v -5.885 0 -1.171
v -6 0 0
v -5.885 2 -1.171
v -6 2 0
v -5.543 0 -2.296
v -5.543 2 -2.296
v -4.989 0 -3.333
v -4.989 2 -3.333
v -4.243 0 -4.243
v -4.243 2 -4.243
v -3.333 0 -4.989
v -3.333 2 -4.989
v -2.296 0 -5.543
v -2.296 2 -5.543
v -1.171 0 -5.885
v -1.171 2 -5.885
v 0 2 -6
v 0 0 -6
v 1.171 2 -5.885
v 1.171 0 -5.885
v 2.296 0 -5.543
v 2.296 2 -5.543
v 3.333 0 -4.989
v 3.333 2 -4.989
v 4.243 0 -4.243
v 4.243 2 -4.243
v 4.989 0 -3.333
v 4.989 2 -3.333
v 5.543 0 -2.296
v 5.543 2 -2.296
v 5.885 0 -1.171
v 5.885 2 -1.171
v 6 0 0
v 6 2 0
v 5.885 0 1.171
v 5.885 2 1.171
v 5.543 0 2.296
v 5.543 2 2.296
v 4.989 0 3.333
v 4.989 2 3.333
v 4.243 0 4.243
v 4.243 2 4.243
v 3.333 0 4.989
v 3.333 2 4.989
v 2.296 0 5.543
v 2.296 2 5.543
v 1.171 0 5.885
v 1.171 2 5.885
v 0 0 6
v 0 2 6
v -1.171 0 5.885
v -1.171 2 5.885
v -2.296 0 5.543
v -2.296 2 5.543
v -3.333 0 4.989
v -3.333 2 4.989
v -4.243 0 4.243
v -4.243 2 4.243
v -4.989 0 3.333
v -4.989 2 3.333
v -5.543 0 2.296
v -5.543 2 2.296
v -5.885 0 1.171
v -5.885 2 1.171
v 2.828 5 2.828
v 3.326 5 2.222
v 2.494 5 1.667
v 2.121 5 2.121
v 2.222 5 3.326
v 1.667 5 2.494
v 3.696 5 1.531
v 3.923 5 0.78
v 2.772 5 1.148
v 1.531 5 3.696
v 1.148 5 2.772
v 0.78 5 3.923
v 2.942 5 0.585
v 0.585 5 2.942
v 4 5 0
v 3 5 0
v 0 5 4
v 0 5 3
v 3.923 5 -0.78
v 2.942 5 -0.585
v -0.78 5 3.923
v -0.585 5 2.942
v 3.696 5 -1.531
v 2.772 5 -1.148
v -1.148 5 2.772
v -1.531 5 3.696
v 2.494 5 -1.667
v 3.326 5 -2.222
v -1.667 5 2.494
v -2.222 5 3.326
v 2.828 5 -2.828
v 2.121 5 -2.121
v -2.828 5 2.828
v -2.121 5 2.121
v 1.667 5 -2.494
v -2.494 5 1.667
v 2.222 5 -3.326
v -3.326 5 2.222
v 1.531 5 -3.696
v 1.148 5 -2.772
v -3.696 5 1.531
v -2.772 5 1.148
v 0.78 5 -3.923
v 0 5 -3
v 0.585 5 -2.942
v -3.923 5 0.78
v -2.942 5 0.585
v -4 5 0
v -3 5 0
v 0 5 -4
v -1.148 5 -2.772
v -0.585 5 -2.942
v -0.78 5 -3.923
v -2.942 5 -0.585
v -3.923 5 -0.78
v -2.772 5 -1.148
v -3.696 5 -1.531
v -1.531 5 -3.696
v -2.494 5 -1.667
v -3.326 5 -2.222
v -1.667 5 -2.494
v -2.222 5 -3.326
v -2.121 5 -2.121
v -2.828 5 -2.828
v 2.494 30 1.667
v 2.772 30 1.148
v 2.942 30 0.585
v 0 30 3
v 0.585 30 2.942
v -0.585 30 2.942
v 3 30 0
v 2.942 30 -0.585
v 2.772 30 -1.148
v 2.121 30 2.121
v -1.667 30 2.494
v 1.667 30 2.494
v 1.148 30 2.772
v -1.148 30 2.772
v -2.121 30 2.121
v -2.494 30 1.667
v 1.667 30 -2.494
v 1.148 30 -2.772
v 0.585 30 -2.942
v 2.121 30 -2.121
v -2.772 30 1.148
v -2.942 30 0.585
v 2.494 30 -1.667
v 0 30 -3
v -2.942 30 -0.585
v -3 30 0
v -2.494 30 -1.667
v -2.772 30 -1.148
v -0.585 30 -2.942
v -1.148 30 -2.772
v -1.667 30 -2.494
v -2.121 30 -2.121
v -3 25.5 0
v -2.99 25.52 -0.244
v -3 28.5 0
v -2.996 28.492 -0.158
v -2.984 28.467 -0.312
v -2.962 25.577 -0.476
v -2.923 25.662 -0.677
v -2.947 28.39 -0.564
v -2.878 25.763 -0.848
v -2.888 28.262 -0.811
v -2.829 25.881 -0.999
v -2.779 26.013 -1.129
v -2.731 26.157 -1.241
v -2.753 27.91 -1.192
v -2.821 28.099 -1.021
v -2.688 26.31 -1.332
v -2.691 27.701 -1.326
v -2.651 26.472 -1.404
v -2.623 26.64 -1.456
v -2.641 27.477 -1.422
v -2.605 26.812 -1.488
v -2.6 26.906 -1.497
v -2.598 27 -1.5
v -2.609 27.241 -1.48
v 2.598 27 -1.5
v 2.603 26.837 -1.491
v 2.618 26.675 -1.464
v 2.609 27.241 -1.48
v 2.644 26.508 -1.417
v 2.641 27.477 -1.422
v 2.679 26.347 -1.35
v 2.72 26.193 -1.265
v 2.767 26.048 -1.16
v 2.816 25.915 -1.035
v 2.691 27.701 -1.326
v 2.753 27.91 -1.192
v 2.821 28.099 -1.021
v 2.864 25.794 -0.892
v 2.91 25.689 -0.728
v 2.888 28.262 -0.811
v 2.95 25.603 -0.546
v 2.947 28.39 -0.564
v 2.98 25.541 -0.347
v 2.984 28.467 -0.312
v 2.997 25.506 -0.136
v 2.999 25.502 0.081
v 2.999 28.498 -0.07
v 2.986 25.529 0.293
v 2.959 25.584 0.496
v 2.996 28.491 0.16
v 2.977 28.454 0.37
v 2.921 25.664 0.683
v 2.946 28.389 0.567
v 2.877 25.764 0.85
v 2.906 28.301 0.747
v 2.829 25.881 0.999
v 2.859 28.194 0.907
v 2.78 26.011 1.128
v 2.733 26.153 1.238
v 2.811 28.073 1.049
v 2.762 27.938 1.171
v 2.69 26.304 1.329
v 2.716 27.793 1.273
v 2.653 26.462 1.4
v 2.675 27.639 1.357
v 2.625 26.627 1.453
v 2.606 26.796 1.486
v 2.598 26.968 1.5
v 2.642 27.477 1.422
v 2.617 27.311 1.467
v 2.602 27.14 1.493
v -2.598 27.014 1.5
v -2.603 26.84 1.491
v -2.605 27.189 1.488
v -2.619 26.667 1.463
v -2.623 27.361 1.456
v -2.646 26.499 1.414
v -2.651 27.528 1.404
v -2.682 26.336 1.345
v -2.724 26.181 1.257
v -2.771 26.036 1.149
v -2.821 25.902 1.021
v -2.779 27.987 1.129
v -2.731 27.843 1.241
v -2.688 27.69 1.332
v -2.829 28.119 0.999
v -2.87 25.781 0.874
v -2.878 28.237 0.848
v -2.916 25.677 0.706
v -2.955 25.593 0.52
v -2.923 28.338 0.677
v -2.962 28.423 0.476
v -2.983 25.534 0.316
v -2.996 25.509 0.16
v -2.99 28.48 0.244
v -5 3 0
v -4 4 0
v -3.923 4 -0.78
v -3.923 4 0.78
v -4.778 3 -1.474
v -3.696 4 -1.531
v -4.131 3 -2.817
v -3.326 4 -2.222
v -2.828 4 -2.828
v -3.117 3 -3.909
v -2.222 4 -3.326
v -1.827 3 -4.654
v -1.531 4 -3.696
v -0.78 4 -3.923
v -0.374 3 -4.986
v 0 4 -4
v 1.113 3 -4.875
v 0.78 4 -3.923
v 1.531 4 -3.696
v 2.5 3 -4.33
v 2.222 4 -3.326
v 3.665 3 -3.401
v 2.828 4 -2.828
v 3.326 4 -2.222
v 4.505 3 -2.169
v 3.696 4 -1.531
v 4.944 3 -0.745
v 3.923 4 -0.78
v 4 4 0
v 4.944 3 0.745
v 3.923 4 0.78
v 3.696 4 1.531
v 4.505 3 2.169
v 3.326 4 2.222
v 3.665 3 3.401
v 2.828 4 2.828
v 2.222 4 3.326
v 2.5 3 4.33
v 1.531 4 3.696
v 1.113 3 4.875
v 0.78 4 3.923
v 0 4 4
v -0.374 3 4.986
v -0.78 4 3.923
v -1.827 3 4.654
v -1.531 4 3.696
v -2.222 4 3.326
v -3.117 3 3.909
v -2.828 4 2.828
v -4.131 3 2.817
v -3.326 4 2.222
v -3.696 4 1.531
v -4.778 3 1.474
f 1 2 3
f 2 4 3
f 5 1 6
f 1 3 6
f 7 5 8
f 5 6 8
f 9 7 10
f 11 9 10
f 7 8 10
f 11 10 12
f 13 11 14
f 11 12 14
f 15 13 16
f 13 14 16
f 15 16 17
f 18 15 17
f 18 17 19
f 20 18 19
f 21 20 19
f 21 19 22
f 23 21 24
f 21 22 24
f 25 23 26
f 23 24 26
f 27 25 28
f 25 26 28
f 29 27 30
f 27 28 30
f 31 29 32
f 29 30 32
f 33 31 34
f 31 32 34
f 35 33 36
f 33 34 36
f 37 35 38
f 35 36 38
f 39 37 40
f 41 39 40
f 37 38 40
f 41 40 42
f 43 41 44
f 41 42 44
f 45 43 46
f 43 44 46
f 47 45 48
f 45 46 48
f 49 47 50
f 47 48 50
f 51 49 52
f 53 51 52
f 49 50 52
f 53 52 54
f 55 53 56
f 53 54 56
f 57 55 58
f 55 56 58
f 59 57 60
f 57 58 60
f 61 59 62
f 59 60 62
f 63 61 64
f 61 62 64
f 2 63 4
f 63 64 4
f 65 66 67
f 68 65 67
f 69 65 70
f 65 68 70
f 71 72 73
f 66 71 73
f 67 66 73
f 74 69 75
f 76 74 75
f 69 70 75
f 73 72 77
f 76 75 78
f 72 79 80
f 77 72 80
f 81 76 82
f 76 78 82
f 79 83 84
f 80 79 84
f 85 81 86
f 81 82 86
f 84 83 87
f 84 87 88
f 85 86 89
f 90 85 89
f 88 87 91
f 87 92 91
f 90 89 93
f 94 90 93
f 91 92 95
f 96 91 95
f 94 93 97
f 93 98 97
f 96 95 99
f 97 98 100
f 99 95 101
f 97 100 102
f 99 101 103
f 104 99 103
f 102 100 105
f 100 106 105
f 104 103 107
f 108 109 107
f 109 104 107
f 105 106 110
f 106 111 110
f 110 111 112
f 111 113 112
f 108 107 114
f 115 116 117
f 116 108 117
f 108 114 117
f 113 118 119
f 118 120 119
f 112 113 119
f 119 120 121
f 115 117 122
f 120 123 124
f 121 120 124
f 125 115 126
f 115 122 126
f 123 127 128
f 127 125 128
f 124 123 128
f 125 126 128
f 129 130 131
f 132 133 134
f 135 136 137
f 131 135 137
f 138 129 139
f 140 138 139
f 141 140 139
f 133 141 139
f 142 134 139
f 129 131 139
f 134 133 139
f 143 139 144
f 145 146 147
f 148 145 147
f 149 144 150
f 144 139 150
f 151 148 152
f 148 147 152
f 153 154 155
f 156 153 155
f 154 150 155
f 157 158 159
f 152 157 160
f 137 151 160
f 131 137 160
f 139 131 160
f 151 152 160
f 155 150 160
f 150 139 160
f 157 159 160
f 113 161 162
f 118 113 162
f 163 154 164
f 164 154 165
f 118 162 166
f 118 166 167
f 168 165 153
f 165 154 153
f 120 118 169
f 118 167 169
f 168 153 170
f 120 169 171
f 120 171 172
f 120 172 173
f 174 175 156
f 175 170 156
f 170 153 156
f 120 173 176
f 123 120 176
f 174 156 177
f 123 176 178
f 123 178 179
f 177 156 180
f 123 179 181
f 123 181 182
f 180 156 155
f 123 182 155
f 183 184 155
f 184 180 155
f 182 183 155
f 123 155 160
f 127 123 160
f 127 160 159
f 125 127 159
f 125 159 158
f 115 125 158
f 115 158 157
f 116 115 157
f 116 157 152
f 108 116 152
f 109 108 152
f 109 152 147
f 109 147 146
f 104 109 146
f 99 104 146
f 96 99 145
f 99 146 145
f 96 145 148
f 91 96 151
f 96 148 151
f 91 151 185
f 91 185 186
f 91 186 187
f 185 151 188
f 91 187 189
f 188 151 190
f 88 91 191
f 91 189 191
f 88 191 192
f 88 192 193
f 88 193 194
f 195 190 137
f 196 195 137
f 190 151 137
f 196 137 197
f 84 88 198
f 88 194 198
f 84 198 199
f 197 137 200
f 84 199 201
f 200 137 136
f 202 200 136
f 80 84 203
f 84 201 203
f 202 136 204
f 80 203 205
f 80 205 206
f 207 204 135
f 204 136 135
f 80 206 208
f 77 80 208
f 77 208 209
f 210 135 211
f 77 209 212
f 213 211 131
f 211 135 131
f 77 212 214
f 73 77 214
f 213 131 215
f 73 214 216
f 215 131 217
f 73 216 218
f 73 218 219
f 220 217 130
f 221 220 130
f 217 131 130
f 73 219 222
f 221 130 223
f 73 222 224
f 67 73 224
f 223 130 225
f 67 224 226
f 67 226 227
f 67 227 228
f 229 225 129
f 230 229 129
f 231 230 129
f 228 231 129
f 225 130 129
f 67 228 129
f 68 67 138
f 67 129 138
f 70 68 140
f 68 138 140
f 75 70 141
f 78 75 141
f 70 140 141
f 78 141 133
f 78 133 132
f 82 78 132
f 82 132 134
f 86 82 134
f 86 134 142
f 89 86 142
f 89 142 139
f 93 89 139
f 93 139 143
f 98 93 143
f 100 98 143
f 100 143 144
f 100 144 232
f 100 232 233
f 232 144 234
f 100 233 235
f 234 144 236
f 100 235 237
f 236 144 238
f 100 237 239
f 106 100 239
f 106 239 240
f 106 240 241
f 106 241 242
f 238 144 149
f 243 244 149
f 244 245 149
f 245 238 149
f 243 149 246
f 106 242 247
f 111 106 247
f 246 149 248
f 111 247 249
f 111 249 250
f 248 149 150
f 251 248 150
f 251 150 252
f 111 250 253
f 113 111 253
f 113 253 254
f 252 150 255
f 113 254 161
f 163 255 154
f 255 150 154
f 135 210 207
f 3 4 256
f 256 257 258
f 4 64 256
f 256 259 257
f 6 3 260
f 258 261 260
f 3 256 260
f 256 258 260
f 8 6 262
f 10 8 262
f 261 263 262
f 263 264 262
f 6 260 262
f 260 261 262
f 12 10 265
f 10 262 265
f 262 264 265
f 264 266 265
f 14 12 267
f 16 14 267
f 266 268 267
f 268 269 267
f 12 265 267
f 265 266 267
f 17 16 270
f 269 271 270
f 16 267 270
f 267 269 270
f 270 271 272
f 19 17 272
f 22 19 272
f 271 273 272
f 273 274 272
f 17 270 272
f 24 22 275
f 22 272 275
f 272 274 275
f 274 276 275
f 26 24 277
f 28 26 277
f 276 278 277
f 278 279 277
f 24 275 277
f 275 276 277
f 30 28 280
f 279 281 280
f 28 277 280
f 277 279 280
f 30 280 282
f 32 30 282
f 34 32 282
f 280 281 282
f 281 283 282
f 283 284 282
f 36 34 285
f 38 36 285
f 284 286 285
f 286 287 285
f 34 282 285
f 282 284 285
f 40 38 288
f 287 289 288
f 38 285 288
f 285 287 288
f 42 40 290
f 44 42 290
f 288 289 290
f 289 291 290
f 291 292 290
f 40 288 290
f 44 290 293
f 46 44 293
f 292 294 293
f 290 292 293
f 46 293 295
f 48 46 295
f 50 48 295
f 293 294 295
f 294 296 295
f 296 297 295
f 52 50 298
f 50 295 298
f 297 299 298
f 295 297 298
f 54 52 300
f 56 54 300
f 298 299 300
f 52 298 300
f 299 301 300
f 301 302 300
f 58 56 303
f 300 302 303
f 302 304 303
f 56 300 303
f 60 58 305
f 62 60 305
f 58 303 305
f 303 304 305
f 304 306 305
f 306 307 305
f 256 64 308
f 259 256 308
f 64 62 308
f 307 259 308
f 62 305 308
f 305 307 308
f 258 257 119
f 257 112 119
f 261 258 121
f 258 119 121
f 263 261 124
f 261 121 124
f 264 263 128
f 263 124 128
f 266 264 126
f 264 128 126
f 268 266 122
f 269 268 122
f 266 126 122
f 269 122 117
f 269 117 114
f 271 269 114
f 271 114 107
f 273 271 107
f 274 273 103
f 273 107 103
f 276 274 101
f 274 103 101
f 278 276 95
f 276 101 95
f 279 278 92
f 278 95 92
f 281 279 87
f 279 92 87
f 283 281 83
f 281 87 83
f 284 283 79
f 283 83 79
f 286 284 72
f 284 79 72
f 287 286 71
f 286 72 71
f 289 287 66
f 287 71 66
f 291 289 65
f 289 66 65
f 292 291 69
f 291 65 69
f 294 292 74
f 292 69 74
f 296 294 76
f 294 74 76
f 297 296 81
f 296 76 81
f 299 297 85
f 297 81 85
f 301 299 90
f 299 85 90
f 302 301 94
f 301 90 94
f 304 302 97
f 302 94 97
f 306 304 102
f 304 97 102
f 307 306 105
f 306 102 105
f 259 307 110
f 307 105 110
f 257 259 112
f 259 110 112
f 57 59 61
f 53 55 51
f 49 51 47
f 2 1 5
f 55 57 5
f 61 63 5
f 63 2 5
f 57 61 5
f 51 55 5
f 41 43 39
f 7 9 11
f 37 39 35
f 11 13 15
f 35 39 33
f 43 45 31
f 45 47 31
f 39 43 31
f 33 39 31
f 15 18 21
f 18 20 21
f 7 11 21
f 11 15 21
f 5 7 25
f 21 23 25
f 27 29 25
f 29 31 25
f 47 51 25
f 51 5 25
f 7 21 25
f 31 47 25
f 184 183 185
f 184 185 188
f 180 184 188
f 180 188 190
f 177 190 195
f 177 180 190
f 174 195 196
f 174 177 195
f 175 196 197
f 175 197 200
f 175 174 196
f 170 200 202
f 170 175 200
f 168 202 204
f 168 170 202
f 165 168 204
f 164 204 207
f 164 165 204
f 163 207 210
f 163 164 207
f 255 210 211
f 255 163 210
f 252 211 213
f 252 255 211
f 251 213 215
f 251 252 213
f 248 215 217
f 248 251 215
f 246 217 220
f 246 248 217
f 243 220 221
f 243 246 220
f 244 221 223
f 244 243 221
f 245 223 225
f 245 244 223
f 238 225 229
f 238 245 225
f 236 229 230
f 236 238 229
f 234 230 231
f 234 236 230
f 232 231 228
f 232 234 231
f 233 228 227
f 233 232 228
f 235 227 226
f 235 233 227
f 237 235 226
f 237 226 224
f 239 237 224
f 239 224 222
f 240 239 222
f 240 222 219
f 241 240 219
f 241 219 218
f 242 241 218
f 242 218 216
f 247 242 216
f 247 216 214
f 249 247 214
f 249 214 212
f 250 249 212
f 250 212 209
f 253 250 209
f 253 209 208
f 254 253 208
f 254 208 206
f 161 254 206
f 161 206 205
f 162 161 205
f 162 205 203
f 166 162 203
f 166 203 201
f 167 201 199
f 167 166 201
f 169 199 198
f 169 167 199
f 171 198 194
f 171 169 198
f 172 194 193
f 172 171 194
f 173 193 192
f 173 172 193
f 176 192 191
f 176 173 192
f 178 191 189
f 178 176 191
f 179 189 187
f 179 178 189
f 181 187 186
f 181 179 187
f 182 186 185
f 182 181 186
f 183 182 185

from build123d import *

# Parameters (mm, degrees)
CUT_EXTRUDE1_DEPTH      = 32.176914536
CUT_EXTRUDE1_DEPTH_BACK = 32.176914536
SKETCH3_R               = 1.5


with BuildPart() as part:
    # Sketch2 → Revolve2 (revolve)
    with BuildSketch(Plane.XY):
        Polygon((0, 0), (-6, 0), (-6, 2), (-4, 4), (-4, 5), (-3, 5), (-3, 30), (0, 30), align=None)
    revolve(axis=Axis((0, 30, 0), (0, -1, 0)))

    # Sketch3 → Cut-Extrude1 (cut, two sides: drawn at the far end of the back side and taken through both)
    with BuildSketch(Plane(origin=(0, 0, 0), x_dir=(0, 0, -1), z_dir=(1, 0, 0)).offset(-CUT_EXTRUDE1_DEPTH_BACK)):
        with Locations((0, 27)):
            Circle(SKETCH3_R)
    extrude(amount=CUT_EXTRUDE1_DEPTH + CUT_EXTRUDE1_DEPTH_BACK, mode=Mode.SUBTRACT)


solid = part.part
